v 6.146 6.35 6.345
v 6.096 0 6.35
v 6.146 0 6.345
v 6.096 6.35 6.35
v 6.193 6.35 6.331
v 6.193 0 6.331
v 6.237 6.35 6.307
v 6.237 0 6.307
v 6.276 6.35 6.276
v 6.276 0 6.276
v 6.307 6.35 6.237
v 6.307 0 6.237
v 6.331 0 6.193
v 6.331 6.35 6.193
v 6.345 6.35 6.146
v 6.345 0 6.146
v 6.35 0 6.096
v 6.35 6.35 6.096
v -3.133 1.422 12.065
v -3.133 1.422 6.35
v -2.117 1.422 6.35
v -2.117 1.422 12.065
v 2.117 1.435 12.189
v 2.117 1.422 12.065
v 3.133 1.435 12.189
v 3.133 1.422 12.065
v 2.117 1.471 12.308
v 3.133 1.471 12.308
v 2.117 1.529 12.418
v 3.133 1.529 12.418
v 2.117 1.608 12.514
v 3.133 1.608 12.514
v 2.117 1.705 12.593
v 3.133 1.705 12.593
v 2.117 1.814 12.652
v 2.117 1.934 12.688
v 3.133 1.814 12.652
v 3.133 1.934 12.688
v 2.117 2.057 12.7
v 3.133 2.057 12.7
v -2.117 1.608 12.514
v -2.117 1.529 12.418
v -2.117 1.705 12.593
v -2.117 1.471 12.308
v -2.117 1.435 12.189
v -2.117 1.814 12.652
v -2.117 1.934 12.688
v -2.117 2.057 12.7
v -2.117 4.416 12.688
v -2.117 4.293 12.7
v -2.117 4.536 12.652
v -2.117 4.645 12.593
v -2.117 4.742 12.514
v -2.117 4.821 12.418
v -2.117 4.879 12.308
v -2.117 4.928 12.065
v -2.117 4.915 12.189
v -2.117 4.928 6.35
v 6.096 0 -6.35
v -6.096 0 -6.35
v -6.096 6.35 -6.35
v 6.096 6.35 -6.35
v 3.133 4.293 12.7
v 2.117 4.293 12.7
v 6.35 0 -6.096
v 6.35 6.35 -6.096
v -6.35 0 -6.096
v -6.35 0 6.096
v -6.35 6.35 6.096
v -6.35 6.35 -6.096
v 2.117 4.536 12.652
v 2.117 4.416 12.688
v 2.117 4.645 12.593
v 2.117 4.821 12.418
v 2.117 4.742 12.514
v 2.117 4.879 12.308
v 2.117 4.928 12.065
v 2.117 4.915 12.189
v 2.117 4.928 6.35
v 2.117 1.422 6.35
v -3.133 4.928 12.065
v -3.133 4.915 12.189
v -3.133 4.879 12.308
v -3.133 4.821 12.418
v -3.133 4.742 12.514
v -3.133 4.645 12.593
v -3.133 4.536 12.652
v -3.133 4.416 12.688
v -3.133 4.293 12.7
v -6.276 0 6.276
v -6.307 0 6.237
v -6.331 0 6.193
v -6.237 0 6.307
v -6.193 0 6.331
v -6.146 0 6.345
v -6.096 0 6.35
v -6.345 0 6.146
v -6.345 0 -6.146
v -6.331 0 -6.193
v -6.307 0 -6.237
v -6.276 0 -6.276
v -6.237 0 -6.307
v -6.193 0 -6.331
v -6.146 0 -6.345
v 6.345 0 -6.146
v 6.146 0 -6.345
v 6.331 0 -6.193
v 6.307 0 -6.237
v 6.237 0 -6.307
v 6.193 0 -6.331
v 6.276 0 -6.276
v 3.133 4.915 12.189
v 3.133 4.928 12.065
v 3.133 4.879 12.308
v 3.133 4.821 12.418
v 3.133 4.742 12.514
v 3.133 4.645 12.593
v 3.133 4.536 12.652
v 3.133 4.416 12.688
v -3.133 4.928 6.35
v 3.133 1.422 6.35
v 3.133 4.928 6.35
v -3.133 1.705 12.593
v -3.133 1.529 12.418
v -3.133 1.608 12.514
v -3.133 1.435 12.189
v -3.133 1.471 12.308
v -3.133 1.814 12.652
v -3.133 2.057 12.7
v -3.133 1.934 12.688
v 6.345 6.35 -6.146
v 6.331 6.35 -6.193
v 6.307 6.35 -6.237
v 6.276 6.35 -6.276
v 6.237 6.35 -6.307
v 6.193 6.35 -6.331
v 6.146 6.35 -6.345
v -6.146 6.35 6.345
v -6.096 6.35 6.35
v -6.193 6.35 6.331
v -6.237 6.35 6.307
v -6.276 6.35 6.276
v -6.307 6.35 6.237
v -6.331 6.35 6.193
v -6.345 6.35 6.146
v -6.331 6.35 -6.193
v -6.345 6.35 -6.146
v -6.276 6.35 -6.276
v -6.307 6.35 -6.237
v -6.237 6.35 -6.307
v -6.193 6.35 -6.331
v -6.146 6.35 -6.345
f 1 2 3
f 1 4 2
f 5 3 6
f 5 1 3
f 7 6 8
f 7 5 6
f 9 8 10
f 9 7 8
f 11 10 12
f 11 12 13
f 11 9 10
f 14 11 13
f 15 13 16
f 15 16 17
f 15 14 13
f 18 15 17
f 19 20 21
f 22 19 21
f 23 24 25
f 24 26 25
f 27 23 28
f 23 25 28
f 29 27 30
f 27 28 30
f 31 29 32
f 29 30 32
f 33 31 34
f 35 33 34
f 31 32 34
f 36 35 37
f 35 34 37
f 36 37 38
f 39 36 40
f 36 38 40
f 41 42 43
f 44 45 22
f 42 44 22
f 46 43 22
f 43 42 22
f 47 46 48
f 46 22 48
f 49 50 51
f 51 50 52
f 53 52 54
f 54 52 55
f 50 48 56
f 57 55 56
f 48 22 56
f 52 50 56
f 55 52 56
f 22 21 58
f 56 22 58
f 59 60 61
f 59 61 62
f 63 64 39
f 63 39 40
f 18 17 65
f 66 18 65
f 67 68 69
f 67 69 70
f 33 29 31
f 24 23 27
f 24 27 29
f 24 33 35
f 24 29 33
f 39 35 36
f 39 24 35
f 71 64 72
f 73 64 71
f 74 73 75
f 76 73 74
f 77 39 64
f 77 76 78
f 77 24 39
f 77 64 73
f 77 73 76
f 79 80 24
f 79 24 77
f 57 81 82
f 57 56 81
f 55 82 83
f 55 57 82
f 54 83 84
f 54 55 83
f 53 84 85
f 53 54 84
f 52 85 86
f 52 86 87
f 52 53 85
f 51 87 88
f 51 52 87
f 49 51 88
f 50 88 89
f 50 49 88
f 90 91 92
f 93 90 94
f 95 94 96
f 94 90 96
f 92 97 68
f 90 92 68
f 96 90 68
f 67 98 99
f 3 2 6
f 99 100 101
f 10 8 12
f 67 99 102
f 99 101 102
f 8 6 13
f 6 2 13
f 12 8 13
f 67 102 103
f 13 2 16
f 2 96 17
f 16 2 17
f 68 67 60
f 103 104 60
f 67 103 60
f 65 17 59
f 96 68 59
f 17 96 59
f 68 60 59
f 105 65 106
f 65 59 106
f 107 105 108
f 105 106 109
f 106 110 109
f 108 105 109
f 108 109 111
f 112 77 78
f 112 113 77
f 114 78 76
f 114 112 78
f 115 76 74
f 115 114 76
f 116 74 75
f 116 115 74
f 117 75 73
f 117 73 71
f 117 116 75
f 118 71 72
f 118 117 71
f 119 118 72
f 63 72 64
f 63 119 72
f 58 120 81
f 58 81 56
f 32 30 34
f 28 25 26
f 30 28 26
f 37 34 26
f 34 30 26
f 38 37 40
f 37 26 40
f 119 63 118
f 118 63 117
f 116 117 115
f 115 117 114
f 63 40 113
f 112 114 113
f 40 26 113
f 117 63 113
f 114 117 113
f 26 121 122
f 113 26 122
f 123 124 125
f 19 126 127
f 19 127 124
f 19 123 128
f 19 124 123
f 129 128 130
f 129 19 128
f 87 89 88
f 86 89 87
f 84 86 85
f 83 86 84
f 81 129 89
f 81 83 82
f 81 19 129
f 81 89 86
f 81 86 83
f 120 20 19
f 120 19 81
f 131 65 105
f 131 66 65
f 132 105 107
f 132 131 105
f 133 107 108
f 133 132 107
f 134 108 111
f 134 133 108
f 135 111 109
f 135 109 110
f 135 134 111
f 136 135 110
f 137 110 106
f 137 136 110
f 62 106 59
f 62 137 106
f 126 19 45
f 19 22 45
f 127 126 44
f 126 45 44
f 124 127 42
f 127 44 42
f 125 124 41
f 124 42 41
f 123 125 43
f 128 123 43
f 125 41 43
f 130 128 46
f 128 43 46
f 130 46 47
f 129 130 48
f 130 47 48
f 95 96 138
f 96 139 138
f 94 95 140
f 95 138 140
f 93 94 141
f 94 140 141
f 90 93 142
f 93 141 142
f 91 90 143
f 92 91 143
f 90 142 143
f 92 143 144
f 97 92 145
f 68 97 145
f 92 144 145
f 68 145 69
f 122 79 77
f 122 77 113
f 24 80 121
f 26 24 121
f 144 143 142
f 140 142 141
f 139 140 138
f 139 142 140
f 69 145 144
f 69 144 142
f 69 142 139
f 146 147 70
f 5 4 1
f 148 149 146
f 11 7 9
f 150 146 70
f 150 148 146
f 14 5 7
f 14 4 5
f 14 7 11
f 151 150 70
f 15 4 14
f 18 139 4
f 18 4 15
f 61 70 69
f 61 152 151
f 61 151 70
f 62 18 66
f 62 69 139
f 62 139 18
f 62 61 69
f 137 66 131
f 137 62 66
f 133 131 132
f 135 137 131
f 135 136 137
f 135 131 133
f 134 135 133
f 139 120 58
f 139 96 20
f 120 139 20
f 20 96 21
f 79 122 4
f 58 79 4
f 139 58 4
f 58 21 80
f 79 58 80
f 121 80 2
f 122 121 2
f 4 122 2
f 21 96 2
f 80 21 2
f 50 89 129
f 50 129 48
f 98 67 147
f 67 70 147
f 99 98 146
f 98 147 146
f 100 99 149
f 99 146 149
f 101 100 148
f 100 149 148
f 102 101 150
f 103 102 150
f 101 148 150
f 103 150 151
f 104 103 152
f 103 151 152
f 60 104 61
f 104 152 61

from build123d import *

# Parameters (mm, degrees)
SKETCH1_W           = 12.7
SKETCH1_H           = 12.7
BOSS_EXTRUDE1_DEPTH = 6.35
SKETCH2_W           = 1.016
SKETCH2_H           = 3.5052
BOSS_EXTRUDE2_DEPTH = 6.35
FILLET1_R           = 0.635
FILLET2_R           = 0.254


with BuildPart() as part:
    # Sketch1 → Boss-Extrude1 (new body)
    with BuildSketch(Plane(origin=(0, 0, 0), x_dir=(1, 0, 0), z_dir=(0, 1, 0))):
        Rectangle(SKETCH1_W, SKETCH1_H)
    extrude(amount=BOSS_EXTRUDE1_DEPTH)

    # Sketch2 → Boss-Extrude2 (add)
    with BuildSketch(Plane.XY.offset(6.35)):
        with Locations((-2.624666667, 3.175)):
            Rectangle(SKETCH2_W, SKETCH2_H)
        with Locations((2.624666667, 3.175)):
            Rectangle(SKETCH2_W, SKETCH2_H)
    extrude(amount=BOSS_EXTRUDE2_DEPTH)

    # Fillet1
    fillet1_edges = [part.edges().sort_by_distance(p)[0] for p in [
        (-2.624666667, 1.4224, 12.7),
        (-2.624666667, 4.9276, 12.7),
        (2.624666667, 4.9276, 12.7),
        (2.624666667, 1.4224, 12.7),
    ]]
    fillet(fillet1_edges, radius=FILLET1_R)

    # Fillet2
    fillet2_edges = [part.edges().sort_by_distance(p)[0] for p in [
        (6.35, 3.175, 6.35),
        (-6.35, 3.175, 6.35),
        (-6.35, 3.175, -6.35),
        (6.35, 3.175, -6.35),
    ]]
    fillet(fillet2_edges, radius=FILLET2_R)


solid = part.part
